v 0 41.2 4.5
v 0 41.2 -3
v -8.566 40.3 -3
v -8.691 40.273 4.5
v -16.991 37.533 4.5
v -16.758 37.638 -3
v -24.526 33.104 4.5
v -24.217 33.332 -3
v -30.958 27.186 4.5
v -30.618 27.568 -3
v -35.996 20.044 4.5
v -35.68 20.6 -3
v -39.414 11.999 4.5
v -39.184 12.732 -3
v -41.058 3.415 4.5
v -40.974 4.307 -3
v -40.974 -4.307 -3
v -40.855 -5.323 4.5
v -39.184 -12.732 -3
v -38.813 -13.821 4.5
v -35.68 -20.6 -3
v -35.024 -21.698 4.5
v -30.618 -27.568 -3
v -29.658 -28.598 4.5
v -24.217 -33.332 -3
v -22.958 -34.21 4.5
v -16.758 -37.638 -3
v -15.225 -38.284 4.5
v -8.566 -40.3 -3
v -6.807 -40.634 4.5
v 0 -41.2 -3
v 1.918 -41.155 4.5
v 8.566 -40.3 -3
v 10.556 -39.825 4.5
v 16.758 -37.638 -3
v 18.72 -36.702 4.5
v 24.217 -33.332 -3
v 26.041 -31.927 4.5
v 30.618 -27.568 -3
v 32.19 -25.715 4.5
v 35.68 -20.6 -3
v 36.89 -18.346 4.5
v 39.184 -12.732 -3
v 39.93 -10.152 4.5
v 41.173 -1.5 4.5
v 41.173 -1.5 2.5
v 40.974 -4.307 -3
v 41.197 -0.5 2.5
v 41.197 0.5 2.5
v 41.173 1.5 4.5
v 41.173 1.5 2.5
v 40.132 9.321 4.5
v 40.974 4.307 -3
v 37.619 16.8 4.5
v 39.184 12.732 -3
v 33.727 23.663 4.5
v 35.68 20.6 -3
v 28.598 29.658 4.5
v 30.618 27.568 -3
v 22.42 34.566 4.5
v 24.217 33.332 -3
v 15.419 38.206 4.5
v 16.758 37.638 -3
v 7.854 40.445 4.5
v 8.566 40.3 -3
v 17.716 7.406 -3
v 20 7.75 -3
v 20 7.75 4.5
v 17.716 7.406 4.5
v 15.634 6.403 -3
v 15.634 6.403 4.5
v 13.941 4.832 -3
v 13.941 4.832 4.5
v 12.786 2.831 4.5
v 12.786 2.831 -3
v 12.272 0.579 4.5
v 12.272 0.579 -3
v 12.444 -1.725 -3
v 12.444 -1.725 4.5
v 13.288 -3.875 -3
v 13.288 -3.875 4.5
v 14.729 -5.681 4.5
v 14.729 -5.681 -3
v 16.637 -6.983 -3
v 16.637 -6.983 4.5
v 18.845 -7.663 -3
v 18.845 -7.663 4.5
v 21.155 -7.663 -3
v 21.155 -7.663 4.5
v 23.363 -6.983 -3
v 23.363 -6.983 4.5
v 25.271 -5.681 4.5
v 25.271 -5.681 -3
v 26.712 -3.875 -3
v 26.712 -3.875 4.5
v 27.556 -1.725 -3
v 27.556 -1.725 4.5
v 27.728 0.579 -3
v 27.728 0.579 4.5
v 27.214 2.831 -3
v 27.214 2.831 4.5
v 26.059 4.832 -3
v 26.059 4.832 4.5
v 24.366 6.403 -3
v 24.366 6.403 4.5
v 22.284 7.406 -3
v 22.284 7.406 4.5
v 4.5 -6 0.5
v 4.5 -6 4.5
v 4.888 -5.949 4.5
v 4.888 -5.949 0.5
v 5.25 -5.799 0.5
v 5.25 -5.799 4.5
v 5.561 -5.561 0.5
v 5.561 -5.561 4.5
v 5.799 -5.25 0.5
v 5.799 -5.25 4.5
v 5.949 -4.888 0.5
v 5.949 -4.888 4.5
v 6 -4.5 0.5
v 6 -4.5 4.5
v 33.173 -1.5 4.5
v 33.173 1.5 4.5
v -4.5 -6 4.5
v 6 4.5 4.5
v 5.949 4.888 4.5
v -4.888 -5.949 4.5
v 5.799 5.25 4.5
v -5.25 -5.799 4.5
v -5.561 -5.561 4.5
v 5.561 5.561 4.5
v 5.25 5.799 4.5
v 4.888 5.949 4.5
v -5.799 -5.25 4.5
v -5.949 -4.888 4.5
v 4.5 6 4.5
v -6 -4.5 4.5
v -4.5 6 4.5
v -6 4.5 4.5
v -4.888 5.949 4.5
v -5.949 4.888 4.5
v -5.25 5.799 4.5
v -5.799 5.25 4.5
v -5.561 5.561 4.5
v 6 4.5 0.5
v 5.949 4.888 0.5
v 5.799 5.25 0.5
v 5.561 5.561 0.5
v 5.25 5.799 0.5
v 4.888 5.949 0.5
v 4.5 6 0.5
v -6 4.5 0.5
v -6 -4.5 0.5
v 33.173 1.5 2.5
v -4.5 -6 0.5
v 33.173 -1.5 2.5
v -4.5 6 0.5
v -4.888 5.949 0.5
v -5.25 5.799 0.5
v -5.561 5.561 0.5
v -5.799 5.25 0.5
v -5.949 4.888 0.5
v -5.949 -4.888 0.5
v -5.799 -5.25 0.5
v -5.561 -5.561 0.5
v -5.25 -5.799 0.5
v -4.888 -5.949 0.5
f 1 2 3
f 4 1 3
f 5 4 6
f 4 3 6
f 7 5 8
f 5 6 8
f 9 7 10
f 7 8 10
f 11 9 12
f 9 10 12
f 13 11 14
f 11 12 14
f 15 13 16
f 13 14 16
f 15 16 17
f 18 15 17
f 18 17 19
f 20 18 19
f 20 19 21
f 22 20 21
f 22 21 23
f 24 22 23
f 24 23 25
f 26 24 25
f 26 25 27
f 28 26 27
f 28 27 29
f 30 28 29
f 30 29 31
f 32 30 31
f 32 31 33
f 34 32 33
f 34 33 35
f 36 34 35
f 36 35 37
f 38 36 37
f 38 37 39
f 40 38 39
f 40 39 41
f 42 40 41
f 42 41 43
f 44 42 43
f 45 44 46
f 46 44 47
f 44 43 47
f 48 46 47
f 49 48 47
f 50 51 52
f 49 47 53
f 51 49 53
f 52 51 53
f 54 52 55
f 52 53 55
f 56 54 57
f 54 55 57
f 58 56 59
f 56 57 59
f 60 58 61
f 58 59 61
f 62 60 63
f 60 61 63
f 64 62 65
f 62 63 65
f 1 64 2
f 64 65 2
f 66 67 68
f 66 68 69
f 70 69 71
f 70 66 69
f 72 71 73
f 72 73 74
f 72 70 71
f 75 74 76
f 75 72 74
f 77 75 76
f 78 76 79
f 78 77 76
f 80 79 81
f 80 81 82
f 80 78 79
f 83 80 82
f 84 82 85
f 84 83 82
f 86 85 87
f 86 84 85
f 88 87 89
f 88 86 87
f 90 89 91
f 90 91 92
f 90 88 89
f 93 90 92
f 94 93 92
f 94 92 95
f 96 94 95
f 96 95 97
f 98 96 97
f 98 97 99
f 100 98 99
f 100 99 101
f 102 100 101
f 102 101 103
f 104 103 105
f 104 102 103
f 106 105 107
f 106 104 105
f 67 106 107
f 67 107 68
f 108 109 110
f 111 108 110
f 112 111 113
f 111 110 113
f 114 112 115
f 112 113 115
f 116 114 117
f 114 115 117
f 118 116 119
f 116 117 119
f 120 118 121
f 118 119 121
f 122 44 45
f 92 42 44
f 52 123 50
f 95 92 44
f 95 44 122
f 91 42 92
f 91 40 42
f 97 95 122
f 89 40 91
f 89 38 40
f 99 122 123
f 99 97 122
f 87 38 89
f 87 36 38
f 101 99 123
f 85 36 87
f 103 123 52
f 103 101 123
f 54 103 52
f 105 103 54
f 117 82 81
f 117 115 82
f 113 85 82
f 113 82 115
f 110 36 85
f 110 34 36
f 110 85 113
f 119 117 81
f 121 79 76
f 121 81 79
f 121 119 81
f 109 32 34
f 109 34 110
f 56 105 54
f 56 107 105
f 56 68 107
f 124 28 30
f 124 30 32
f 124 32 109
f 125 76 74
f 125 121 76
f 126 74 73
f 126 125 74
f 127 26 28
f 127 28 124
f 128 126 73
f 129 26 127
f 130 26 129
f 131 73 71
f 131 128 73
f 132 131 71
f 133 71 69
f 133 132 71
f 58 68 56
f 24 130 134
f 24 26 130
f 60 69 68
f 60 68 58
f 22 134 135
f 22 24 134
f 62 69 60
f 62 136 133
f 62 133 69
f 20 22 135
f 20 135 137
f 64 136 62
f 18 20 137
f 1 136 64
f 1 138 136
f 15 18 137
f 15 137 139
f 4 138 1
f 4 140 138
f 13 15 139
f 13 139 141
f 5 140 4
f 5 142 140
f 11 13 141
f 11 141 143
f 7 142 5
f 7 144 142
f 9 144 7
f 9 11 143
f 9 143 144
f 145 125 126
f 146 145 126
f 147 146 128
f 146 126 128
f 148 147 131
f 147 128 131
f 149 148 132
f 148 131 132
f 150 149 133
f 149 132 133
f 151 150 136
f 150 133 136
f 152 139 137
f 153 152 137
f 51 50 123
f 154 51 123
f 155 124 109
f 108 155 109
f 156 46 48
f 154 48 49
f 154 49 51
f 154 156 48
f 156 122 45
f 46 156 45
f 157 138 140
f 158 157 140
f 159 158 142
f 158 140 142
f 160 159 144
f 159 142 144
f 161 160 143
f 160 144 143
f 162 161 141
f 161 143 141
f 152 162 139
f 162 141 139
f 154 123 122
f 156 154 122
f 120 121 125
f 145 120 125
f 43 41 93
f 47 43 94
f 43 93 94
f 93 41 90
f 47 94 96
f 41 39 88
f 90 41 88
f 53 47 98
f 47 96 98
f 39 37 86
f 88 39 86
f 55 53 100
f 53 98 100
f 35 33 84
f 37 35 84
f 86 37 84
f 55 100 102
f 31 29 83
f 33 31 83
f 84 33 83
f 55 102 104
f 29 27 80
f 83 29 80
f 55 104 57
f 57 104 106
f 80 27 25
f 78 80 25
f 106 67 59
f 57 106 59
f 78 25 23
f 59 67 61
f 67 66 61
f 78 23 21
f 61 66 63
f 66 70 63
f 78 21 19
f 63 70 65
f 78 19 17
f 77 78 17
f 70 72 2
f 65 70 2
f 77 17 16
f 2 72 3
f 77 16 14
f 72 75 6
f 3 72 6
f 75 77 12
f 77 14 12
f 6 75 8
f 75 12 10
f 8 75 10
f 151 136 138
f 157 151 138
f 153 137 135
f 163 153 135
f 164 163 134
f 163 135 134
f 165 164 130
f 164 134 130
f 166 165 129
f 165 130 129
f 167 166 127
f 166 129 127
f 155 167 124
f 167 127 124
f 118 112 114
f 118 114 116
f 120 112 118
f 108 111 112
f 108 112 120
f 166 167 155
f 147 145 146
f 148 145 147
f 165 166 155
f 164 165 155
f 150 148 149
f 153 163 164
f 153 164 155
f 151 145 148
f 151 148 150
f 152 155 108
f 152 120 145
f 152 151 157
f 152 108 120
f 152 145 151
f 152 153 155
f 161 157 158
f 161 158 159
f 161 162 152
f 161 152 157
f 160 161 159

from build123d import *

# Parameters (mm, degrees)
SKETCH004_R             = 41.2
SKETCH004_R_2           = 7.75
PAD002_DEPTH            = 7.5
POCKET007_DEPTH         = 2
POCKET008_DEPTH         = 4
BODY002_PLACEMENT_ANGLE = 90


with BuildPart() as part:
    # Sketch004 → Pad002 (new body)
    with BuildSketch(Plane.XY):
        Circle(SKETCH004_R)
        with Locations((0, -20)):
            Circle(SKETCH004_R_2, mode=Mode.SUBTRACT)
    extrude(amount=PAD002_DEPTH)

    # Sketch018 (on Face4 of Pad002) → Pocket007 (cut)
    with BuildSketch(Plane.XY.offset(7.5)):
        with BuildLine():
            Line((-1.5, -33.172685), (-1.5, -41.172685))
            ThreePointArc((-1.5, -41.172685), (0, -41.2), (1.5, -41.172685))
            Line((1.5, -41.172685), (1.5, -33.172685))
            Line((1.5, -33.172685), (-1.5, -33.172685))
        make_face()
    extrude(amount=-POCKET007_DEPTH, mode=Mode.SUBTRACT)

    # Sketch019 (on Face3 of Pocket007) → Pocket008 (cut)
    with BuildSketch(Plane.XY.offset(7.5)):
        with BuildLine():
            Line((-6, 4.5), (-6, -4.5))
            ThreePointArc((-6, -4.5), (-5.56066, -5.56066), (-4.5, -6))
            Line((-4.5, -6), (4.5, -6))
            ThreePointArc((4.5, -6), (5.56066, -5.56066), (6, -4.5))
            Line((6, -4.5), (6, 4.5))
            ThreePointArc((6, 4.5), (5.56066, 5.56066), (4.5, 6))
            Line((4.5, 6), (-4.5, 6))
            ThreePointArc((-4.5, 6), (-5.56066, 5.56066), (-6, 4.5))
        make_face()
    extrude(amount=-POCKET008_DEPTH, mode=Mode.SUBTRACT)


with BuildPart() as part_1:
    # Body002 placement: moved
    add(part.part.moved(Location((0, 0, -3))).rotate(Axis((0, 0, -3), (0, 0, 1)), BODY002_PLACEMENT_ANGLE))


solid = part_1.part
